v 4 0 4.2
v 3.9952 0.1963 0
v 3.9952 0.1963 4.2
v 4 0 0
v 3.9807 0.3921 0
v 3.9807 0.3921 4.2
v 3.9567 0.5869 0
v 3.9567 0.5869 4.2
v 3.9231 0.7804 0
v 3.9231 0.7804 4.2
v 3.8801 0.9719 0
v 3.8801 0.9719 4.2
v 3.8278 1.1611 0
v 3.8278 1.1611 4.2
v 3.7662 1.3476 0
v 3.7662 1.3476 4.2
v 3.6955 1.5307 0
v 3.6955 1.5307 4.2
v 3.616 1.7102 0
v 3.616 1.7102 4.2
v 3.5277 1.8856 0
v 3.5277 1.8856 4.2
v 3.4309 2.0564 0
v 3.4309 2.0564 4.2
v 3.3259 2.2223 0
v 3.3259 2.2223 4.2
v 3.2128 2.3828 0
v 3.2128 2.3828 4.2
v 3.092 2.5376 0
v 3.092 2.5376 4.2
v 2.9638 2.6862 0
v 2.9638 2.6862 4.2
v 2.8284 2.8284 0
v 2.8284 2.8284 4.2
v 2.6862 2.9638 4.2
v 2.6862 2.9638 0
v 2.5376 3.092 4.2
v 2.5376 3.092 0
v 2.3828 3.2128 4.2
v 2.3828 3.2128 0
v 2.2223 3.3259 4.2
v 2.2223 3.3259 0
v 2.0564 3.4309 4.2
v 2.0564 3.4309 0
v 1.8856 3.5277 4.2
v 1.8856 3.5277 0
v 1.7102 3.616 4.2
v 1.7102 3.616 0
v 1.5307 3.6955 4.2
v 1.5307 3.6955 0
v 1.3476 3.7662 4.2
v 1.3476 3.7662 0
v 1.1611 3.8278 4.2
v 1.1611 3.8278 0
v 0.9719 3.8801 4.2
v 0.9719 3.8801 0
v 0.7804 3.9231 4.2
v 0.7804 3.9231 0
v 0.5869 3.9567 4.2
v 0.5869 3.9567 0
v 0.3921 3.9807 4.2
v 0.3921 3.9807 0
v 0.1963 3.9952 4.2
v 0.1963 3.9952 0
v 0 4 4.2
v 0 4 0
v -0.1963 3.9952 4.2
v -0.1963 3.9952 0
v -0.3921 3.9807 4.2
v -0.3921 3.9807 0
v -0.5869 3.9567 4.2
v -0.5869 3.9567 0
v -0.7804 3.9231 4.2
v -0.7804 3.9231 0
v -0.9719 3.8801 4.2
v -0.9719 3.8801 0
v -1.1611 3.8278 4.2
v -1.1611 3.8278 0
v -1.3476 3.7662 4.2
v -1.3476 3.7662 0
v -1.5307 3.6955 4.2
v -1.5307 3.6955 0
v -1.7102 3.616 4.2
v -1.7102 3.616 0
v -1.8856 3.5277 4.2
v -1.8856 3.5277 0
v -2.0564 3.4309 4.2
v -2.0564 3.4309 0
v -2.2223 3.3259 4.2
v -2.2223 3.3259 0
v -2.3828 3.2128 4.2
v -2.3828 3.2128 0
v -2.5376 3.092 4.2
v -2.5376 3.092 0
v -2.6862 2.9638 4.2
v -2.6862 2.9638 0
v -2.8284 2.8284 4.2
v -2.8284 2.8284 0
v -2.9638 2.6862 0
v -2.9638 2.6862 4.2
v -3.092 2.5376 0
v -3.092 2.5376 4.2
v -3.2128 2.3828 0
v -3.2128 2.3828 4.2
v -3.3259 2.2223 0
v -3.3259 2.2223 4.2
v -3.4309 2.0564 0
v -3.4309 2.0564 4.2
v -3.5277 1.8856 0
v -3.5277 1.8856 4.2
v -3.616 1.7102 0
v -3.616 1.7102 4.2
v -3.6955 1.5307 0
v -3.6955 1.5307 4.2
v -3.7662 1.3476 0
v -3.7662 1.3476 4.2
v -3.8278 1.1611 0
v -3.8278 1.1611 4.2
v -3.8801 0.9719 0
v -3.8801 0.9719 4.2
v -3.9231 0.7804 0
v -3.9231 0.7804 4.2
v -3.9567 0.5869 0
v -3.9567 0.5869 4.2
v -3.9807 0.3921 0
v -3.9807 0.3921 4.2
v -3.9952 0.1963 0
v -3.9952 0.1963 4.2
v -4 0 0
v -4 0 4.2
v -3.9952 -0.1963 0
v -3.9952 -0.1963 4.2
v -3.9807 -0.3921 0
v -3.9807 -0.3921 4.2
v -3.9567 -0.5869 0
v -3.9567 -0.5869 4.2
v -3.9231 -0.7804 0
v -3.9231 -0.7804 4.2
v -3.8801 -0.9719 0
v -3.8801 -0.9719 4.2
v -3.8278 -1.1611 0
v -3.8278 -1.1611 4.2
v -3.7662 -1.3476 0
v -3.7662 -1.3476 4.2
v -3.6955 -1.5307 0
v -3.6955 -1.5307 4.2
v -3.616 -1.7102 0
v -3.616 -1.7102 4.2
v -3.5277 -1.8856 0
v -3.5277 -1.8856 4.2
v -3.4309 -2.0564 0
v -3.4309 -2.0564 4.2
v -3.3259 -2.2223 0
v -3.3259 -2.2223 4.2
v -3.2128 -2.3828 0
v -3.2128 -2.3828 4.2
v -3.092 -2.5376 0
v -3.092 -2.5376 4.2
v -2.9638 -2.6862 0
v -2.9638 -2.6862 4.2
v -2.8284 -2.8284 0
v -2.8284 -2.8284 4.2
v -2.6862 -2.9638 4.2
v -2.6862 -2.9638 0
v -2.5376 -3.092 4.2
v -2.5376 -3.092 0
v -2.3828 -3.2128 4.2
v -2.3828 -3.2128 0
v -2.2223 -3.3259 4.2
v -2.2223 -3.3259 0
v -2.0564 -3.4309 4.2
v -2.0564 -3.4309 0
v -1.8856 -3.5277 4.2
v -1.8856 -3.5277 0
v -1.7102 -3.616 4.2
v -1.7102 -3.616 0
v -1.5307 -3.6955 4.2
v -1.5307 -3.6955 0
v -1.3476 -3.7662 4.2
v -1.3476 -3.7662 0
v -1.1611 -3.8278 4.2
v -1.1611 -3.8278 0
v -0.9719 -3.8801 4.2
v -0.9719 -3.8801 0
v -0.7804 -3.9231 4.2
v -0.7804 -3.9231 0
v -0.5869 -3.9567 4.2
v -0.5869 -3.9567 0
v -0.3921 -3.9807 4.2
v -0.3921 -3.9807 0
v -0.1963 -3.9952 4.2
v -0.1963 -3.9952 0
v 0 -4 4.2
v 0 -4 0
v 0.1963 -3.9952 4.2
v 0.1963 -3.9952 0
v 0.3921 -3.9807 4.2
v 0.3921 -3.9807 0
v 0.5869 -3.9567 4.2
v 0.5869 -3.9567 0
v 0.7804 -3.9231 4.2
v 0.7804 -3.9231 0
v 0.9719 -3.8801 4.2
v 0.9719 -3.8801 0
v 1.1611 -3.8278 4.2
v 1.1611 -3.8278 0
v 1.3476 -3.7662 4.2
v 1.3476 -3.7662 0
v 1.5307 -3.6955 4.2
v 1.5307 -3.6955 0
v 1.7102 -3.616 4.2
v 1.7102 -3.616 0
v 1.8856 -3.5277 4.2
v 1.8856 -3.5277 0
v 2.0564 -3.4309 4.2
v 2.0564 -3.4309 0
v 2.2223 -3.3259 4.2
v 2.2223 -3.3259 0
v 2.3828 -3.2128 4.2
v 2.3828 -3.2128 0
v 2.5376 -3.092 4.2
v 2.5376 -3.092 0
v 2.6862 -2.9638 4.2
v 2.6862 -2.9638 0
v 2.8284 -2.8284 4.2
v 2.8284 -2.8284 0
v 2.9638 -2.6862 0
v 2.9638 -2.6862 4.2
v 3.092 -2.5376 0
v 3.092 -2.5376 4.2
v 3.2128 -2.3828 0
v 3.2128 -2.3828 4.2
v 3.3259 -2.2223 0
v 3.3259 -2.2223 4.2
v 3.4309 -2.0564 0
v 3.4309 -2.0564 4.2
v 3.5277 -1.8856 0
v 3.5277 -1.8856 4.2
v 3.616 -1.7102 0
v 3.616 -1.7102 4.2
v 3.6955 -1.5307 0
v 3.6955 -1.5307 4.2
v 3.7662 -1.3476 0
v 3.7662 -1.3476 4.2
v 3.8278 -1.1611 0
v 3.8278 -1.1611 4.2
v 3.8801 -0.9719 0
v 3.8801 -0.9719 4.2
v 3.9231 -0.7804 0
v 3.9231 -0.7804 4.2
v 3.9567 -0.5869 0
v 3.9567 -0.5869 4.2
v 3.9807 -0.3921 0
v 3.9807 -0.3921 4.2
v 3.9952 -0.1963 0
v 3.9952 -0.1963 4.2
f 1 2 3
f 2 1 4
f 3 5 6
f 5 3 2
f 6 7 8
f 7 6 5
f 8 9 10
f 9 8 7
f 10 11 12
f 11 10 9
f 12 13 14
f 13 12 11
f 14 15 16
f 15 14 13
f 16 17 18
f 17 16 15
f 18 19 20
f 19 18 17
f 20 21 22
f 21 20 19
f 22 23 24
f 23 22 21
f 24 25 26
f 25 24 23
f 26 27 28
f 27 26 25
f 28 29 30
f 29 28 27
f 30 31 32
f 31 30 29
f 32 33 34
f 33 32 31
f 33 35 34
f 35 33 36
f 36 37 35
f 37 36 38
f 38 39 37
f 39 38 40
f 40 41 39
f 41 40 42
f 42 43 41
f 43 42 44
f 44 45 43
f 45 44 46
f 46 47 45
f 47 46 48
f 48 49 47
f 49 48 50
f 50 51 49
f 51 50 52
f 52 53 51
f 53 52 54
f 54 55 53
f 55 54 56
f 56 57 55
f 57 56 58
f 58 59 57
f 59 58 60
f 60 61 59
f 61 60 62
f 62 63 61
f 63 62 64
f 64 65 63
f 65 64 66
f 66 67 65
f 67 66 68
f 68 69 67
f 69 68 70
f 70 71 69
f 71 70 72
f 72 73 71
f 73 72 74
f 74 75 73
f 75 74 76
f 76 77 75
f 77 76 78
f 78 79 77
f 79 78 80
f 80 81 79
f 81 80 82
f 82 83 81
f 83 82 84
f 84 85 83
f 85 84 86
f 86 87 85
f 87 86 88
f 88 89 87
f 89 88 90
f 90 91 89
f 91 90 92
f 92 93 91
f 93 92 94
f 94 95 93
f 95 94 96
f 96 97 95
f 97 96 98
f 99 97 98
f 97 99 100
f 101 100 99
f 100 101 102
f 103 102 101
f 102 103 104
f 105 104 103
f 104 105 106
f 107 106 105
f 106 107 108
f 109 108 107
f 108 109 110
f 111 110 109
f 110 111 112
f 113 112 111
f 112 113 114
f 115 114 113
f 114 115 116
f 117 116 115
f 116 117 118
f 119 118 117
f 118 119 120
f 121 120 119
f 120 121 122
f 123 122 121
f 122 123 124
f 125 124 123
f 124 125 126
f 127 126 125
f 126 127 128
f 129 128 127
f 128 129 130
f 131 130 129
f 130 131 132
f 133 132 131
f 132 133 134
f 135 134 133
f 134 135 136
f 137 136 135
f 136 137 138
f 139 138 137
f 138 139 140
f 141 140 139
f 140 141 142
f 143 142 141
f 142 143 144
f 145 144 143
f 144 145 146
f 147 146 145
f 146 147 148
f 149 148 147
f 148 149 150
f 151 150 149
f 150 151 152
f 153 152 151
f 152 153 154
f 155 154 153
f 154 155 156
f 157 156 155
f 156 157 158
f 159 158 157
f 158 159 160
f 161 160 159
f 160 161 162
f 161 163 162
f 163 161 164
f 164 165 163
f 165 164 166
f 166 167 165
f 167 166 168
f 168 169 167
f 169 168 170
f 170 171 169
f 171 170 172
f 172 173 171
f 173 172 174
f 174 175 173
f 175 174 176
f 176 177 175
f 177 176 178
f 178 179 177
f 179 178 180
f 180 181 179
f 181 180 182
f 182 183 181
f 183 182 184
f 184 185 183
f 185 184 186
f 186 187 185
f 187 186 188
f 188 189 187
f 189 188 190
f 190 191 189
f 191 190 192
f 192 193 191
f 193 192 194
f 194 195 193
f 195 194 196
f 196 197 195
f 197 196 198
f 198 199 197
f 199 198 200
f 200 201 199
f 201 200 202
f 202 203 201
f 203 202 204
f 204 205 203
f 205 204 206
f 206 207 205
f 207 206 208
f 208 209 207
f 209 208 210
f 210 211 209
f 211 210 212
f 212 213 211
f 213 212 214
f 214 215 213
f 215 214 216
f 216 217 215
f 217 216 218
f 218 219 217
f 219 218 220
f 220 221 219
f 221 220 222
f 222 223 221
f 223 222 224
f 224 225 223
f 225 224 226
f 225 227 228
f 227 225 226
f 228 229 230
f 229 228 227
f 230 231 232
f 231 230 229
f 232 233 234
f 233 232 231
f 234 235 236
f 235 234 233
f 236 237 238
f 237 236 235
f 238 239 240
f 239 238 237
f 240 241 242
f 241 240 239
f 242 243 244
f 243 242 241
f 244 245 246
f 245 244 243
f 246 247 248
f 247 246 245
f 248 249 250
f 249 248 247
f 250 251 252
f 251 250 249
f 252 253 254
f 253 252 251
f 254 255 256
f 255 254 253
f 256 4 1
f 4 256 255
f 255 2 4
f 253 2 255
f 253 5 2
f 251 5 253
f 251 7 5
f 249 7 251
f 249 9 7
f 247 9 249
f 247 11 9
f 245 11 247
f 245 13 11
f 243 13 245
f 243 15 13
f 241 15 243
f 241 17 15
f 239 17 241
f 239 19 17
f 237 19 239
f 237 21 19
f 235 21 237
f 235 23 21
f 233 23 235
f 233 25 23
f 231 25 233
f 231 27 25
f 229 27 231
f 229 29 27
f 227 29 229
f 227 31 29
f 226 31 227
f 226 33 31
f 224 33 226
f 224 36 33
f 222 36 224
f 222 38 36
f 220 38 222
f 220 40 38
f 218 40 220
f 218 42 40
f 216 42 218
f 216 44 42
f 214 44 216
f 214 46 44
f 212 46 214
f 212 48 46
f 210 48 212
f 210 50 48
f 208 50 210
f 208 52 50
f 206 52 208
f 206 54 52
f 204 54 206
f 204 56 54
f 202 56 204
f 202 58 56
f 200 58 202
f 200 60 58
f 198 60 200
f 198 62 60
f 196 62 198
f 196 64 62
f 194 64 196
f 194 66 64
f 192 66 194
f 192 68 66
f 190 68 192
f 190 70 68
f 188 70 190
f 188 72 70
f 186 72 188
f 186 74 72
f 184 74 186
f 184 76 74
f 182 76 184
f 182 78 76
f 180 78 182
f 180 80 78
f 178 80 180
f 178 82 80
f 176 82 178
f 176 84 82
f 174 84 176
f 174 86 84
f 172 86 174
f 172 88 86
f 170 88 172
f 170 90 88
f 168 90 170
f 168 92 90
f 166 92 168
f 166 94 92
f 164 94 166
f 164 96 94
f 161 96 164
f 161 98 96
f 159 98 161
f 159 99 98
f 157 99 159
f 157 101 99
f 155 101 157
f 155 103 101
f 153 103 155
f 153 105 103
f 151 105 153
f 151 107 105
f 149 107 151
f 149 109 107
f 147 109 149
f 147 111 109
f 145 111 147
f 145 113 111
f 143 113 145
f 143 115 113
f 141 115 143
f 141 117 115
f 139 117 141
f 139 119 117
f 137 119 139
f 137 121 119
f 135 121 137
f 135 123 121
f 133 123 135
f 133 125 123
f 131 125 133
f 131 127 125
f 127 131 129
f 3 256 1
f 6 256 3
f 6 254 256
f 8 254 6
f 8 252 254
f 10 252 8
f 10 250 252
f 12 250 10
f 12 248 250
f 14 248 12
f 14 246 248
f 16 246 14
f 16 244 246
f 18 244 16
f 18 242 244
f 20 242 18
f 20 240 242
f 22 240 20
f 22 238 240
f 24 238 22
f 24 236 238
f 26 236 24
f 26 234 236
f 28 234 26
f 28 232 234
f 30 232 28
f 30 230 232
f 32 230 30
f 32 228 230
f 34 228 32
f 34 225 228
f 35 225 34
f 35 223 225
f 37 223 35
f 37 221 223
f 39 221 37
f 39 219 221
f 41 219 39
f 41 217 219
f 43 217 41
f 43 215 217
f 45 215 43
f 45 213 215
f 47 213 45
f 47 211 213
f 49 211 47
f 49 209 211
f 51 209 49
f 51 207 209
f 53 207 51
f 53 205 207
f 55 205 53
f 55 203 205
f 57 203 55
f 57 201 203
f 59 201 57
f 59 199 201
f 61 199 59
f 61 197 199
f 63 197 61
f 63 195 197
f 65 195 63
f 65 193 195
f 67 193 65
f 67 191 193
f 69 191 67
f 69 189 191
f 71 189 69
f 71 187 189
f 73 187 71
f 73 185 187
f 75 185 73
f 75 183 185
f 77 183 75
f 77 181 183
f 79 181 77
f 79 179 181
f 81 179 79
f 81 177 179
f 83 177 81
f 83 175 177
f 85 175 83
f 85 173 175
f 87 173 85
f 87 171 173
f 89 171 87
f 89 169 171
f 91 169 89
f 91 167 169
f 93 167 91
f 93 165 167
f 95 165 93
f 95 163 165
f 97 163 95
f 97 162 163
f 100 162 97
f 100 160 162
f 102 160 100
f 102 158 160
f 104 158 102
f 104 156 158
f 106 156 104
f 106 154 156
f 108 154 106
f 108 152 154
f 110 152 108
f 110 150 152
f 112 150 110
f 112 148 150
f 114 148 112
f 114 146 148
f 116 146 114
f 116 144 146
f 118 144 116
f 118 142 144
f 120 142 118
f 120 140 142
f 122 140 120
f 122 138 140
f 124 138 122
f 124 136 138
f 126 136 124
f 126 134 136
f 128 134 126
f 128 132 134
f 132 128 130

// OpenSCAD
// Permanent magnet: 8.0mm diameter, 4.2mm tall

outer_diameter_mm = 8.0;   //[4:16:0.1]
height_mm         = 4.2;   //[2.1:8.4:0.1]
inner_diameter_mm = 0.0;   //[0:6:0.1]
eps_mm            = 0.2;   //[0.05:1:0.05]

$fn = 128;

module magnet(od=outer_diameter_mm, h=height_mm, id=inner_diameter_mm, eps=eps_mm) {
    // Single connected solid by default (no bore)
    color([0.72, 0.45, 0.2])
    if (id <= 0) {
        cylinder(d=od, h=h, center=false);
    } else {
        difference() {
            cylinder(d=od, h=h, center=false);
            translate([0, 0, -eps])
                cylinder(d=id, h=h + 2*eps, center=false);
        }
    }
}

magnet();
